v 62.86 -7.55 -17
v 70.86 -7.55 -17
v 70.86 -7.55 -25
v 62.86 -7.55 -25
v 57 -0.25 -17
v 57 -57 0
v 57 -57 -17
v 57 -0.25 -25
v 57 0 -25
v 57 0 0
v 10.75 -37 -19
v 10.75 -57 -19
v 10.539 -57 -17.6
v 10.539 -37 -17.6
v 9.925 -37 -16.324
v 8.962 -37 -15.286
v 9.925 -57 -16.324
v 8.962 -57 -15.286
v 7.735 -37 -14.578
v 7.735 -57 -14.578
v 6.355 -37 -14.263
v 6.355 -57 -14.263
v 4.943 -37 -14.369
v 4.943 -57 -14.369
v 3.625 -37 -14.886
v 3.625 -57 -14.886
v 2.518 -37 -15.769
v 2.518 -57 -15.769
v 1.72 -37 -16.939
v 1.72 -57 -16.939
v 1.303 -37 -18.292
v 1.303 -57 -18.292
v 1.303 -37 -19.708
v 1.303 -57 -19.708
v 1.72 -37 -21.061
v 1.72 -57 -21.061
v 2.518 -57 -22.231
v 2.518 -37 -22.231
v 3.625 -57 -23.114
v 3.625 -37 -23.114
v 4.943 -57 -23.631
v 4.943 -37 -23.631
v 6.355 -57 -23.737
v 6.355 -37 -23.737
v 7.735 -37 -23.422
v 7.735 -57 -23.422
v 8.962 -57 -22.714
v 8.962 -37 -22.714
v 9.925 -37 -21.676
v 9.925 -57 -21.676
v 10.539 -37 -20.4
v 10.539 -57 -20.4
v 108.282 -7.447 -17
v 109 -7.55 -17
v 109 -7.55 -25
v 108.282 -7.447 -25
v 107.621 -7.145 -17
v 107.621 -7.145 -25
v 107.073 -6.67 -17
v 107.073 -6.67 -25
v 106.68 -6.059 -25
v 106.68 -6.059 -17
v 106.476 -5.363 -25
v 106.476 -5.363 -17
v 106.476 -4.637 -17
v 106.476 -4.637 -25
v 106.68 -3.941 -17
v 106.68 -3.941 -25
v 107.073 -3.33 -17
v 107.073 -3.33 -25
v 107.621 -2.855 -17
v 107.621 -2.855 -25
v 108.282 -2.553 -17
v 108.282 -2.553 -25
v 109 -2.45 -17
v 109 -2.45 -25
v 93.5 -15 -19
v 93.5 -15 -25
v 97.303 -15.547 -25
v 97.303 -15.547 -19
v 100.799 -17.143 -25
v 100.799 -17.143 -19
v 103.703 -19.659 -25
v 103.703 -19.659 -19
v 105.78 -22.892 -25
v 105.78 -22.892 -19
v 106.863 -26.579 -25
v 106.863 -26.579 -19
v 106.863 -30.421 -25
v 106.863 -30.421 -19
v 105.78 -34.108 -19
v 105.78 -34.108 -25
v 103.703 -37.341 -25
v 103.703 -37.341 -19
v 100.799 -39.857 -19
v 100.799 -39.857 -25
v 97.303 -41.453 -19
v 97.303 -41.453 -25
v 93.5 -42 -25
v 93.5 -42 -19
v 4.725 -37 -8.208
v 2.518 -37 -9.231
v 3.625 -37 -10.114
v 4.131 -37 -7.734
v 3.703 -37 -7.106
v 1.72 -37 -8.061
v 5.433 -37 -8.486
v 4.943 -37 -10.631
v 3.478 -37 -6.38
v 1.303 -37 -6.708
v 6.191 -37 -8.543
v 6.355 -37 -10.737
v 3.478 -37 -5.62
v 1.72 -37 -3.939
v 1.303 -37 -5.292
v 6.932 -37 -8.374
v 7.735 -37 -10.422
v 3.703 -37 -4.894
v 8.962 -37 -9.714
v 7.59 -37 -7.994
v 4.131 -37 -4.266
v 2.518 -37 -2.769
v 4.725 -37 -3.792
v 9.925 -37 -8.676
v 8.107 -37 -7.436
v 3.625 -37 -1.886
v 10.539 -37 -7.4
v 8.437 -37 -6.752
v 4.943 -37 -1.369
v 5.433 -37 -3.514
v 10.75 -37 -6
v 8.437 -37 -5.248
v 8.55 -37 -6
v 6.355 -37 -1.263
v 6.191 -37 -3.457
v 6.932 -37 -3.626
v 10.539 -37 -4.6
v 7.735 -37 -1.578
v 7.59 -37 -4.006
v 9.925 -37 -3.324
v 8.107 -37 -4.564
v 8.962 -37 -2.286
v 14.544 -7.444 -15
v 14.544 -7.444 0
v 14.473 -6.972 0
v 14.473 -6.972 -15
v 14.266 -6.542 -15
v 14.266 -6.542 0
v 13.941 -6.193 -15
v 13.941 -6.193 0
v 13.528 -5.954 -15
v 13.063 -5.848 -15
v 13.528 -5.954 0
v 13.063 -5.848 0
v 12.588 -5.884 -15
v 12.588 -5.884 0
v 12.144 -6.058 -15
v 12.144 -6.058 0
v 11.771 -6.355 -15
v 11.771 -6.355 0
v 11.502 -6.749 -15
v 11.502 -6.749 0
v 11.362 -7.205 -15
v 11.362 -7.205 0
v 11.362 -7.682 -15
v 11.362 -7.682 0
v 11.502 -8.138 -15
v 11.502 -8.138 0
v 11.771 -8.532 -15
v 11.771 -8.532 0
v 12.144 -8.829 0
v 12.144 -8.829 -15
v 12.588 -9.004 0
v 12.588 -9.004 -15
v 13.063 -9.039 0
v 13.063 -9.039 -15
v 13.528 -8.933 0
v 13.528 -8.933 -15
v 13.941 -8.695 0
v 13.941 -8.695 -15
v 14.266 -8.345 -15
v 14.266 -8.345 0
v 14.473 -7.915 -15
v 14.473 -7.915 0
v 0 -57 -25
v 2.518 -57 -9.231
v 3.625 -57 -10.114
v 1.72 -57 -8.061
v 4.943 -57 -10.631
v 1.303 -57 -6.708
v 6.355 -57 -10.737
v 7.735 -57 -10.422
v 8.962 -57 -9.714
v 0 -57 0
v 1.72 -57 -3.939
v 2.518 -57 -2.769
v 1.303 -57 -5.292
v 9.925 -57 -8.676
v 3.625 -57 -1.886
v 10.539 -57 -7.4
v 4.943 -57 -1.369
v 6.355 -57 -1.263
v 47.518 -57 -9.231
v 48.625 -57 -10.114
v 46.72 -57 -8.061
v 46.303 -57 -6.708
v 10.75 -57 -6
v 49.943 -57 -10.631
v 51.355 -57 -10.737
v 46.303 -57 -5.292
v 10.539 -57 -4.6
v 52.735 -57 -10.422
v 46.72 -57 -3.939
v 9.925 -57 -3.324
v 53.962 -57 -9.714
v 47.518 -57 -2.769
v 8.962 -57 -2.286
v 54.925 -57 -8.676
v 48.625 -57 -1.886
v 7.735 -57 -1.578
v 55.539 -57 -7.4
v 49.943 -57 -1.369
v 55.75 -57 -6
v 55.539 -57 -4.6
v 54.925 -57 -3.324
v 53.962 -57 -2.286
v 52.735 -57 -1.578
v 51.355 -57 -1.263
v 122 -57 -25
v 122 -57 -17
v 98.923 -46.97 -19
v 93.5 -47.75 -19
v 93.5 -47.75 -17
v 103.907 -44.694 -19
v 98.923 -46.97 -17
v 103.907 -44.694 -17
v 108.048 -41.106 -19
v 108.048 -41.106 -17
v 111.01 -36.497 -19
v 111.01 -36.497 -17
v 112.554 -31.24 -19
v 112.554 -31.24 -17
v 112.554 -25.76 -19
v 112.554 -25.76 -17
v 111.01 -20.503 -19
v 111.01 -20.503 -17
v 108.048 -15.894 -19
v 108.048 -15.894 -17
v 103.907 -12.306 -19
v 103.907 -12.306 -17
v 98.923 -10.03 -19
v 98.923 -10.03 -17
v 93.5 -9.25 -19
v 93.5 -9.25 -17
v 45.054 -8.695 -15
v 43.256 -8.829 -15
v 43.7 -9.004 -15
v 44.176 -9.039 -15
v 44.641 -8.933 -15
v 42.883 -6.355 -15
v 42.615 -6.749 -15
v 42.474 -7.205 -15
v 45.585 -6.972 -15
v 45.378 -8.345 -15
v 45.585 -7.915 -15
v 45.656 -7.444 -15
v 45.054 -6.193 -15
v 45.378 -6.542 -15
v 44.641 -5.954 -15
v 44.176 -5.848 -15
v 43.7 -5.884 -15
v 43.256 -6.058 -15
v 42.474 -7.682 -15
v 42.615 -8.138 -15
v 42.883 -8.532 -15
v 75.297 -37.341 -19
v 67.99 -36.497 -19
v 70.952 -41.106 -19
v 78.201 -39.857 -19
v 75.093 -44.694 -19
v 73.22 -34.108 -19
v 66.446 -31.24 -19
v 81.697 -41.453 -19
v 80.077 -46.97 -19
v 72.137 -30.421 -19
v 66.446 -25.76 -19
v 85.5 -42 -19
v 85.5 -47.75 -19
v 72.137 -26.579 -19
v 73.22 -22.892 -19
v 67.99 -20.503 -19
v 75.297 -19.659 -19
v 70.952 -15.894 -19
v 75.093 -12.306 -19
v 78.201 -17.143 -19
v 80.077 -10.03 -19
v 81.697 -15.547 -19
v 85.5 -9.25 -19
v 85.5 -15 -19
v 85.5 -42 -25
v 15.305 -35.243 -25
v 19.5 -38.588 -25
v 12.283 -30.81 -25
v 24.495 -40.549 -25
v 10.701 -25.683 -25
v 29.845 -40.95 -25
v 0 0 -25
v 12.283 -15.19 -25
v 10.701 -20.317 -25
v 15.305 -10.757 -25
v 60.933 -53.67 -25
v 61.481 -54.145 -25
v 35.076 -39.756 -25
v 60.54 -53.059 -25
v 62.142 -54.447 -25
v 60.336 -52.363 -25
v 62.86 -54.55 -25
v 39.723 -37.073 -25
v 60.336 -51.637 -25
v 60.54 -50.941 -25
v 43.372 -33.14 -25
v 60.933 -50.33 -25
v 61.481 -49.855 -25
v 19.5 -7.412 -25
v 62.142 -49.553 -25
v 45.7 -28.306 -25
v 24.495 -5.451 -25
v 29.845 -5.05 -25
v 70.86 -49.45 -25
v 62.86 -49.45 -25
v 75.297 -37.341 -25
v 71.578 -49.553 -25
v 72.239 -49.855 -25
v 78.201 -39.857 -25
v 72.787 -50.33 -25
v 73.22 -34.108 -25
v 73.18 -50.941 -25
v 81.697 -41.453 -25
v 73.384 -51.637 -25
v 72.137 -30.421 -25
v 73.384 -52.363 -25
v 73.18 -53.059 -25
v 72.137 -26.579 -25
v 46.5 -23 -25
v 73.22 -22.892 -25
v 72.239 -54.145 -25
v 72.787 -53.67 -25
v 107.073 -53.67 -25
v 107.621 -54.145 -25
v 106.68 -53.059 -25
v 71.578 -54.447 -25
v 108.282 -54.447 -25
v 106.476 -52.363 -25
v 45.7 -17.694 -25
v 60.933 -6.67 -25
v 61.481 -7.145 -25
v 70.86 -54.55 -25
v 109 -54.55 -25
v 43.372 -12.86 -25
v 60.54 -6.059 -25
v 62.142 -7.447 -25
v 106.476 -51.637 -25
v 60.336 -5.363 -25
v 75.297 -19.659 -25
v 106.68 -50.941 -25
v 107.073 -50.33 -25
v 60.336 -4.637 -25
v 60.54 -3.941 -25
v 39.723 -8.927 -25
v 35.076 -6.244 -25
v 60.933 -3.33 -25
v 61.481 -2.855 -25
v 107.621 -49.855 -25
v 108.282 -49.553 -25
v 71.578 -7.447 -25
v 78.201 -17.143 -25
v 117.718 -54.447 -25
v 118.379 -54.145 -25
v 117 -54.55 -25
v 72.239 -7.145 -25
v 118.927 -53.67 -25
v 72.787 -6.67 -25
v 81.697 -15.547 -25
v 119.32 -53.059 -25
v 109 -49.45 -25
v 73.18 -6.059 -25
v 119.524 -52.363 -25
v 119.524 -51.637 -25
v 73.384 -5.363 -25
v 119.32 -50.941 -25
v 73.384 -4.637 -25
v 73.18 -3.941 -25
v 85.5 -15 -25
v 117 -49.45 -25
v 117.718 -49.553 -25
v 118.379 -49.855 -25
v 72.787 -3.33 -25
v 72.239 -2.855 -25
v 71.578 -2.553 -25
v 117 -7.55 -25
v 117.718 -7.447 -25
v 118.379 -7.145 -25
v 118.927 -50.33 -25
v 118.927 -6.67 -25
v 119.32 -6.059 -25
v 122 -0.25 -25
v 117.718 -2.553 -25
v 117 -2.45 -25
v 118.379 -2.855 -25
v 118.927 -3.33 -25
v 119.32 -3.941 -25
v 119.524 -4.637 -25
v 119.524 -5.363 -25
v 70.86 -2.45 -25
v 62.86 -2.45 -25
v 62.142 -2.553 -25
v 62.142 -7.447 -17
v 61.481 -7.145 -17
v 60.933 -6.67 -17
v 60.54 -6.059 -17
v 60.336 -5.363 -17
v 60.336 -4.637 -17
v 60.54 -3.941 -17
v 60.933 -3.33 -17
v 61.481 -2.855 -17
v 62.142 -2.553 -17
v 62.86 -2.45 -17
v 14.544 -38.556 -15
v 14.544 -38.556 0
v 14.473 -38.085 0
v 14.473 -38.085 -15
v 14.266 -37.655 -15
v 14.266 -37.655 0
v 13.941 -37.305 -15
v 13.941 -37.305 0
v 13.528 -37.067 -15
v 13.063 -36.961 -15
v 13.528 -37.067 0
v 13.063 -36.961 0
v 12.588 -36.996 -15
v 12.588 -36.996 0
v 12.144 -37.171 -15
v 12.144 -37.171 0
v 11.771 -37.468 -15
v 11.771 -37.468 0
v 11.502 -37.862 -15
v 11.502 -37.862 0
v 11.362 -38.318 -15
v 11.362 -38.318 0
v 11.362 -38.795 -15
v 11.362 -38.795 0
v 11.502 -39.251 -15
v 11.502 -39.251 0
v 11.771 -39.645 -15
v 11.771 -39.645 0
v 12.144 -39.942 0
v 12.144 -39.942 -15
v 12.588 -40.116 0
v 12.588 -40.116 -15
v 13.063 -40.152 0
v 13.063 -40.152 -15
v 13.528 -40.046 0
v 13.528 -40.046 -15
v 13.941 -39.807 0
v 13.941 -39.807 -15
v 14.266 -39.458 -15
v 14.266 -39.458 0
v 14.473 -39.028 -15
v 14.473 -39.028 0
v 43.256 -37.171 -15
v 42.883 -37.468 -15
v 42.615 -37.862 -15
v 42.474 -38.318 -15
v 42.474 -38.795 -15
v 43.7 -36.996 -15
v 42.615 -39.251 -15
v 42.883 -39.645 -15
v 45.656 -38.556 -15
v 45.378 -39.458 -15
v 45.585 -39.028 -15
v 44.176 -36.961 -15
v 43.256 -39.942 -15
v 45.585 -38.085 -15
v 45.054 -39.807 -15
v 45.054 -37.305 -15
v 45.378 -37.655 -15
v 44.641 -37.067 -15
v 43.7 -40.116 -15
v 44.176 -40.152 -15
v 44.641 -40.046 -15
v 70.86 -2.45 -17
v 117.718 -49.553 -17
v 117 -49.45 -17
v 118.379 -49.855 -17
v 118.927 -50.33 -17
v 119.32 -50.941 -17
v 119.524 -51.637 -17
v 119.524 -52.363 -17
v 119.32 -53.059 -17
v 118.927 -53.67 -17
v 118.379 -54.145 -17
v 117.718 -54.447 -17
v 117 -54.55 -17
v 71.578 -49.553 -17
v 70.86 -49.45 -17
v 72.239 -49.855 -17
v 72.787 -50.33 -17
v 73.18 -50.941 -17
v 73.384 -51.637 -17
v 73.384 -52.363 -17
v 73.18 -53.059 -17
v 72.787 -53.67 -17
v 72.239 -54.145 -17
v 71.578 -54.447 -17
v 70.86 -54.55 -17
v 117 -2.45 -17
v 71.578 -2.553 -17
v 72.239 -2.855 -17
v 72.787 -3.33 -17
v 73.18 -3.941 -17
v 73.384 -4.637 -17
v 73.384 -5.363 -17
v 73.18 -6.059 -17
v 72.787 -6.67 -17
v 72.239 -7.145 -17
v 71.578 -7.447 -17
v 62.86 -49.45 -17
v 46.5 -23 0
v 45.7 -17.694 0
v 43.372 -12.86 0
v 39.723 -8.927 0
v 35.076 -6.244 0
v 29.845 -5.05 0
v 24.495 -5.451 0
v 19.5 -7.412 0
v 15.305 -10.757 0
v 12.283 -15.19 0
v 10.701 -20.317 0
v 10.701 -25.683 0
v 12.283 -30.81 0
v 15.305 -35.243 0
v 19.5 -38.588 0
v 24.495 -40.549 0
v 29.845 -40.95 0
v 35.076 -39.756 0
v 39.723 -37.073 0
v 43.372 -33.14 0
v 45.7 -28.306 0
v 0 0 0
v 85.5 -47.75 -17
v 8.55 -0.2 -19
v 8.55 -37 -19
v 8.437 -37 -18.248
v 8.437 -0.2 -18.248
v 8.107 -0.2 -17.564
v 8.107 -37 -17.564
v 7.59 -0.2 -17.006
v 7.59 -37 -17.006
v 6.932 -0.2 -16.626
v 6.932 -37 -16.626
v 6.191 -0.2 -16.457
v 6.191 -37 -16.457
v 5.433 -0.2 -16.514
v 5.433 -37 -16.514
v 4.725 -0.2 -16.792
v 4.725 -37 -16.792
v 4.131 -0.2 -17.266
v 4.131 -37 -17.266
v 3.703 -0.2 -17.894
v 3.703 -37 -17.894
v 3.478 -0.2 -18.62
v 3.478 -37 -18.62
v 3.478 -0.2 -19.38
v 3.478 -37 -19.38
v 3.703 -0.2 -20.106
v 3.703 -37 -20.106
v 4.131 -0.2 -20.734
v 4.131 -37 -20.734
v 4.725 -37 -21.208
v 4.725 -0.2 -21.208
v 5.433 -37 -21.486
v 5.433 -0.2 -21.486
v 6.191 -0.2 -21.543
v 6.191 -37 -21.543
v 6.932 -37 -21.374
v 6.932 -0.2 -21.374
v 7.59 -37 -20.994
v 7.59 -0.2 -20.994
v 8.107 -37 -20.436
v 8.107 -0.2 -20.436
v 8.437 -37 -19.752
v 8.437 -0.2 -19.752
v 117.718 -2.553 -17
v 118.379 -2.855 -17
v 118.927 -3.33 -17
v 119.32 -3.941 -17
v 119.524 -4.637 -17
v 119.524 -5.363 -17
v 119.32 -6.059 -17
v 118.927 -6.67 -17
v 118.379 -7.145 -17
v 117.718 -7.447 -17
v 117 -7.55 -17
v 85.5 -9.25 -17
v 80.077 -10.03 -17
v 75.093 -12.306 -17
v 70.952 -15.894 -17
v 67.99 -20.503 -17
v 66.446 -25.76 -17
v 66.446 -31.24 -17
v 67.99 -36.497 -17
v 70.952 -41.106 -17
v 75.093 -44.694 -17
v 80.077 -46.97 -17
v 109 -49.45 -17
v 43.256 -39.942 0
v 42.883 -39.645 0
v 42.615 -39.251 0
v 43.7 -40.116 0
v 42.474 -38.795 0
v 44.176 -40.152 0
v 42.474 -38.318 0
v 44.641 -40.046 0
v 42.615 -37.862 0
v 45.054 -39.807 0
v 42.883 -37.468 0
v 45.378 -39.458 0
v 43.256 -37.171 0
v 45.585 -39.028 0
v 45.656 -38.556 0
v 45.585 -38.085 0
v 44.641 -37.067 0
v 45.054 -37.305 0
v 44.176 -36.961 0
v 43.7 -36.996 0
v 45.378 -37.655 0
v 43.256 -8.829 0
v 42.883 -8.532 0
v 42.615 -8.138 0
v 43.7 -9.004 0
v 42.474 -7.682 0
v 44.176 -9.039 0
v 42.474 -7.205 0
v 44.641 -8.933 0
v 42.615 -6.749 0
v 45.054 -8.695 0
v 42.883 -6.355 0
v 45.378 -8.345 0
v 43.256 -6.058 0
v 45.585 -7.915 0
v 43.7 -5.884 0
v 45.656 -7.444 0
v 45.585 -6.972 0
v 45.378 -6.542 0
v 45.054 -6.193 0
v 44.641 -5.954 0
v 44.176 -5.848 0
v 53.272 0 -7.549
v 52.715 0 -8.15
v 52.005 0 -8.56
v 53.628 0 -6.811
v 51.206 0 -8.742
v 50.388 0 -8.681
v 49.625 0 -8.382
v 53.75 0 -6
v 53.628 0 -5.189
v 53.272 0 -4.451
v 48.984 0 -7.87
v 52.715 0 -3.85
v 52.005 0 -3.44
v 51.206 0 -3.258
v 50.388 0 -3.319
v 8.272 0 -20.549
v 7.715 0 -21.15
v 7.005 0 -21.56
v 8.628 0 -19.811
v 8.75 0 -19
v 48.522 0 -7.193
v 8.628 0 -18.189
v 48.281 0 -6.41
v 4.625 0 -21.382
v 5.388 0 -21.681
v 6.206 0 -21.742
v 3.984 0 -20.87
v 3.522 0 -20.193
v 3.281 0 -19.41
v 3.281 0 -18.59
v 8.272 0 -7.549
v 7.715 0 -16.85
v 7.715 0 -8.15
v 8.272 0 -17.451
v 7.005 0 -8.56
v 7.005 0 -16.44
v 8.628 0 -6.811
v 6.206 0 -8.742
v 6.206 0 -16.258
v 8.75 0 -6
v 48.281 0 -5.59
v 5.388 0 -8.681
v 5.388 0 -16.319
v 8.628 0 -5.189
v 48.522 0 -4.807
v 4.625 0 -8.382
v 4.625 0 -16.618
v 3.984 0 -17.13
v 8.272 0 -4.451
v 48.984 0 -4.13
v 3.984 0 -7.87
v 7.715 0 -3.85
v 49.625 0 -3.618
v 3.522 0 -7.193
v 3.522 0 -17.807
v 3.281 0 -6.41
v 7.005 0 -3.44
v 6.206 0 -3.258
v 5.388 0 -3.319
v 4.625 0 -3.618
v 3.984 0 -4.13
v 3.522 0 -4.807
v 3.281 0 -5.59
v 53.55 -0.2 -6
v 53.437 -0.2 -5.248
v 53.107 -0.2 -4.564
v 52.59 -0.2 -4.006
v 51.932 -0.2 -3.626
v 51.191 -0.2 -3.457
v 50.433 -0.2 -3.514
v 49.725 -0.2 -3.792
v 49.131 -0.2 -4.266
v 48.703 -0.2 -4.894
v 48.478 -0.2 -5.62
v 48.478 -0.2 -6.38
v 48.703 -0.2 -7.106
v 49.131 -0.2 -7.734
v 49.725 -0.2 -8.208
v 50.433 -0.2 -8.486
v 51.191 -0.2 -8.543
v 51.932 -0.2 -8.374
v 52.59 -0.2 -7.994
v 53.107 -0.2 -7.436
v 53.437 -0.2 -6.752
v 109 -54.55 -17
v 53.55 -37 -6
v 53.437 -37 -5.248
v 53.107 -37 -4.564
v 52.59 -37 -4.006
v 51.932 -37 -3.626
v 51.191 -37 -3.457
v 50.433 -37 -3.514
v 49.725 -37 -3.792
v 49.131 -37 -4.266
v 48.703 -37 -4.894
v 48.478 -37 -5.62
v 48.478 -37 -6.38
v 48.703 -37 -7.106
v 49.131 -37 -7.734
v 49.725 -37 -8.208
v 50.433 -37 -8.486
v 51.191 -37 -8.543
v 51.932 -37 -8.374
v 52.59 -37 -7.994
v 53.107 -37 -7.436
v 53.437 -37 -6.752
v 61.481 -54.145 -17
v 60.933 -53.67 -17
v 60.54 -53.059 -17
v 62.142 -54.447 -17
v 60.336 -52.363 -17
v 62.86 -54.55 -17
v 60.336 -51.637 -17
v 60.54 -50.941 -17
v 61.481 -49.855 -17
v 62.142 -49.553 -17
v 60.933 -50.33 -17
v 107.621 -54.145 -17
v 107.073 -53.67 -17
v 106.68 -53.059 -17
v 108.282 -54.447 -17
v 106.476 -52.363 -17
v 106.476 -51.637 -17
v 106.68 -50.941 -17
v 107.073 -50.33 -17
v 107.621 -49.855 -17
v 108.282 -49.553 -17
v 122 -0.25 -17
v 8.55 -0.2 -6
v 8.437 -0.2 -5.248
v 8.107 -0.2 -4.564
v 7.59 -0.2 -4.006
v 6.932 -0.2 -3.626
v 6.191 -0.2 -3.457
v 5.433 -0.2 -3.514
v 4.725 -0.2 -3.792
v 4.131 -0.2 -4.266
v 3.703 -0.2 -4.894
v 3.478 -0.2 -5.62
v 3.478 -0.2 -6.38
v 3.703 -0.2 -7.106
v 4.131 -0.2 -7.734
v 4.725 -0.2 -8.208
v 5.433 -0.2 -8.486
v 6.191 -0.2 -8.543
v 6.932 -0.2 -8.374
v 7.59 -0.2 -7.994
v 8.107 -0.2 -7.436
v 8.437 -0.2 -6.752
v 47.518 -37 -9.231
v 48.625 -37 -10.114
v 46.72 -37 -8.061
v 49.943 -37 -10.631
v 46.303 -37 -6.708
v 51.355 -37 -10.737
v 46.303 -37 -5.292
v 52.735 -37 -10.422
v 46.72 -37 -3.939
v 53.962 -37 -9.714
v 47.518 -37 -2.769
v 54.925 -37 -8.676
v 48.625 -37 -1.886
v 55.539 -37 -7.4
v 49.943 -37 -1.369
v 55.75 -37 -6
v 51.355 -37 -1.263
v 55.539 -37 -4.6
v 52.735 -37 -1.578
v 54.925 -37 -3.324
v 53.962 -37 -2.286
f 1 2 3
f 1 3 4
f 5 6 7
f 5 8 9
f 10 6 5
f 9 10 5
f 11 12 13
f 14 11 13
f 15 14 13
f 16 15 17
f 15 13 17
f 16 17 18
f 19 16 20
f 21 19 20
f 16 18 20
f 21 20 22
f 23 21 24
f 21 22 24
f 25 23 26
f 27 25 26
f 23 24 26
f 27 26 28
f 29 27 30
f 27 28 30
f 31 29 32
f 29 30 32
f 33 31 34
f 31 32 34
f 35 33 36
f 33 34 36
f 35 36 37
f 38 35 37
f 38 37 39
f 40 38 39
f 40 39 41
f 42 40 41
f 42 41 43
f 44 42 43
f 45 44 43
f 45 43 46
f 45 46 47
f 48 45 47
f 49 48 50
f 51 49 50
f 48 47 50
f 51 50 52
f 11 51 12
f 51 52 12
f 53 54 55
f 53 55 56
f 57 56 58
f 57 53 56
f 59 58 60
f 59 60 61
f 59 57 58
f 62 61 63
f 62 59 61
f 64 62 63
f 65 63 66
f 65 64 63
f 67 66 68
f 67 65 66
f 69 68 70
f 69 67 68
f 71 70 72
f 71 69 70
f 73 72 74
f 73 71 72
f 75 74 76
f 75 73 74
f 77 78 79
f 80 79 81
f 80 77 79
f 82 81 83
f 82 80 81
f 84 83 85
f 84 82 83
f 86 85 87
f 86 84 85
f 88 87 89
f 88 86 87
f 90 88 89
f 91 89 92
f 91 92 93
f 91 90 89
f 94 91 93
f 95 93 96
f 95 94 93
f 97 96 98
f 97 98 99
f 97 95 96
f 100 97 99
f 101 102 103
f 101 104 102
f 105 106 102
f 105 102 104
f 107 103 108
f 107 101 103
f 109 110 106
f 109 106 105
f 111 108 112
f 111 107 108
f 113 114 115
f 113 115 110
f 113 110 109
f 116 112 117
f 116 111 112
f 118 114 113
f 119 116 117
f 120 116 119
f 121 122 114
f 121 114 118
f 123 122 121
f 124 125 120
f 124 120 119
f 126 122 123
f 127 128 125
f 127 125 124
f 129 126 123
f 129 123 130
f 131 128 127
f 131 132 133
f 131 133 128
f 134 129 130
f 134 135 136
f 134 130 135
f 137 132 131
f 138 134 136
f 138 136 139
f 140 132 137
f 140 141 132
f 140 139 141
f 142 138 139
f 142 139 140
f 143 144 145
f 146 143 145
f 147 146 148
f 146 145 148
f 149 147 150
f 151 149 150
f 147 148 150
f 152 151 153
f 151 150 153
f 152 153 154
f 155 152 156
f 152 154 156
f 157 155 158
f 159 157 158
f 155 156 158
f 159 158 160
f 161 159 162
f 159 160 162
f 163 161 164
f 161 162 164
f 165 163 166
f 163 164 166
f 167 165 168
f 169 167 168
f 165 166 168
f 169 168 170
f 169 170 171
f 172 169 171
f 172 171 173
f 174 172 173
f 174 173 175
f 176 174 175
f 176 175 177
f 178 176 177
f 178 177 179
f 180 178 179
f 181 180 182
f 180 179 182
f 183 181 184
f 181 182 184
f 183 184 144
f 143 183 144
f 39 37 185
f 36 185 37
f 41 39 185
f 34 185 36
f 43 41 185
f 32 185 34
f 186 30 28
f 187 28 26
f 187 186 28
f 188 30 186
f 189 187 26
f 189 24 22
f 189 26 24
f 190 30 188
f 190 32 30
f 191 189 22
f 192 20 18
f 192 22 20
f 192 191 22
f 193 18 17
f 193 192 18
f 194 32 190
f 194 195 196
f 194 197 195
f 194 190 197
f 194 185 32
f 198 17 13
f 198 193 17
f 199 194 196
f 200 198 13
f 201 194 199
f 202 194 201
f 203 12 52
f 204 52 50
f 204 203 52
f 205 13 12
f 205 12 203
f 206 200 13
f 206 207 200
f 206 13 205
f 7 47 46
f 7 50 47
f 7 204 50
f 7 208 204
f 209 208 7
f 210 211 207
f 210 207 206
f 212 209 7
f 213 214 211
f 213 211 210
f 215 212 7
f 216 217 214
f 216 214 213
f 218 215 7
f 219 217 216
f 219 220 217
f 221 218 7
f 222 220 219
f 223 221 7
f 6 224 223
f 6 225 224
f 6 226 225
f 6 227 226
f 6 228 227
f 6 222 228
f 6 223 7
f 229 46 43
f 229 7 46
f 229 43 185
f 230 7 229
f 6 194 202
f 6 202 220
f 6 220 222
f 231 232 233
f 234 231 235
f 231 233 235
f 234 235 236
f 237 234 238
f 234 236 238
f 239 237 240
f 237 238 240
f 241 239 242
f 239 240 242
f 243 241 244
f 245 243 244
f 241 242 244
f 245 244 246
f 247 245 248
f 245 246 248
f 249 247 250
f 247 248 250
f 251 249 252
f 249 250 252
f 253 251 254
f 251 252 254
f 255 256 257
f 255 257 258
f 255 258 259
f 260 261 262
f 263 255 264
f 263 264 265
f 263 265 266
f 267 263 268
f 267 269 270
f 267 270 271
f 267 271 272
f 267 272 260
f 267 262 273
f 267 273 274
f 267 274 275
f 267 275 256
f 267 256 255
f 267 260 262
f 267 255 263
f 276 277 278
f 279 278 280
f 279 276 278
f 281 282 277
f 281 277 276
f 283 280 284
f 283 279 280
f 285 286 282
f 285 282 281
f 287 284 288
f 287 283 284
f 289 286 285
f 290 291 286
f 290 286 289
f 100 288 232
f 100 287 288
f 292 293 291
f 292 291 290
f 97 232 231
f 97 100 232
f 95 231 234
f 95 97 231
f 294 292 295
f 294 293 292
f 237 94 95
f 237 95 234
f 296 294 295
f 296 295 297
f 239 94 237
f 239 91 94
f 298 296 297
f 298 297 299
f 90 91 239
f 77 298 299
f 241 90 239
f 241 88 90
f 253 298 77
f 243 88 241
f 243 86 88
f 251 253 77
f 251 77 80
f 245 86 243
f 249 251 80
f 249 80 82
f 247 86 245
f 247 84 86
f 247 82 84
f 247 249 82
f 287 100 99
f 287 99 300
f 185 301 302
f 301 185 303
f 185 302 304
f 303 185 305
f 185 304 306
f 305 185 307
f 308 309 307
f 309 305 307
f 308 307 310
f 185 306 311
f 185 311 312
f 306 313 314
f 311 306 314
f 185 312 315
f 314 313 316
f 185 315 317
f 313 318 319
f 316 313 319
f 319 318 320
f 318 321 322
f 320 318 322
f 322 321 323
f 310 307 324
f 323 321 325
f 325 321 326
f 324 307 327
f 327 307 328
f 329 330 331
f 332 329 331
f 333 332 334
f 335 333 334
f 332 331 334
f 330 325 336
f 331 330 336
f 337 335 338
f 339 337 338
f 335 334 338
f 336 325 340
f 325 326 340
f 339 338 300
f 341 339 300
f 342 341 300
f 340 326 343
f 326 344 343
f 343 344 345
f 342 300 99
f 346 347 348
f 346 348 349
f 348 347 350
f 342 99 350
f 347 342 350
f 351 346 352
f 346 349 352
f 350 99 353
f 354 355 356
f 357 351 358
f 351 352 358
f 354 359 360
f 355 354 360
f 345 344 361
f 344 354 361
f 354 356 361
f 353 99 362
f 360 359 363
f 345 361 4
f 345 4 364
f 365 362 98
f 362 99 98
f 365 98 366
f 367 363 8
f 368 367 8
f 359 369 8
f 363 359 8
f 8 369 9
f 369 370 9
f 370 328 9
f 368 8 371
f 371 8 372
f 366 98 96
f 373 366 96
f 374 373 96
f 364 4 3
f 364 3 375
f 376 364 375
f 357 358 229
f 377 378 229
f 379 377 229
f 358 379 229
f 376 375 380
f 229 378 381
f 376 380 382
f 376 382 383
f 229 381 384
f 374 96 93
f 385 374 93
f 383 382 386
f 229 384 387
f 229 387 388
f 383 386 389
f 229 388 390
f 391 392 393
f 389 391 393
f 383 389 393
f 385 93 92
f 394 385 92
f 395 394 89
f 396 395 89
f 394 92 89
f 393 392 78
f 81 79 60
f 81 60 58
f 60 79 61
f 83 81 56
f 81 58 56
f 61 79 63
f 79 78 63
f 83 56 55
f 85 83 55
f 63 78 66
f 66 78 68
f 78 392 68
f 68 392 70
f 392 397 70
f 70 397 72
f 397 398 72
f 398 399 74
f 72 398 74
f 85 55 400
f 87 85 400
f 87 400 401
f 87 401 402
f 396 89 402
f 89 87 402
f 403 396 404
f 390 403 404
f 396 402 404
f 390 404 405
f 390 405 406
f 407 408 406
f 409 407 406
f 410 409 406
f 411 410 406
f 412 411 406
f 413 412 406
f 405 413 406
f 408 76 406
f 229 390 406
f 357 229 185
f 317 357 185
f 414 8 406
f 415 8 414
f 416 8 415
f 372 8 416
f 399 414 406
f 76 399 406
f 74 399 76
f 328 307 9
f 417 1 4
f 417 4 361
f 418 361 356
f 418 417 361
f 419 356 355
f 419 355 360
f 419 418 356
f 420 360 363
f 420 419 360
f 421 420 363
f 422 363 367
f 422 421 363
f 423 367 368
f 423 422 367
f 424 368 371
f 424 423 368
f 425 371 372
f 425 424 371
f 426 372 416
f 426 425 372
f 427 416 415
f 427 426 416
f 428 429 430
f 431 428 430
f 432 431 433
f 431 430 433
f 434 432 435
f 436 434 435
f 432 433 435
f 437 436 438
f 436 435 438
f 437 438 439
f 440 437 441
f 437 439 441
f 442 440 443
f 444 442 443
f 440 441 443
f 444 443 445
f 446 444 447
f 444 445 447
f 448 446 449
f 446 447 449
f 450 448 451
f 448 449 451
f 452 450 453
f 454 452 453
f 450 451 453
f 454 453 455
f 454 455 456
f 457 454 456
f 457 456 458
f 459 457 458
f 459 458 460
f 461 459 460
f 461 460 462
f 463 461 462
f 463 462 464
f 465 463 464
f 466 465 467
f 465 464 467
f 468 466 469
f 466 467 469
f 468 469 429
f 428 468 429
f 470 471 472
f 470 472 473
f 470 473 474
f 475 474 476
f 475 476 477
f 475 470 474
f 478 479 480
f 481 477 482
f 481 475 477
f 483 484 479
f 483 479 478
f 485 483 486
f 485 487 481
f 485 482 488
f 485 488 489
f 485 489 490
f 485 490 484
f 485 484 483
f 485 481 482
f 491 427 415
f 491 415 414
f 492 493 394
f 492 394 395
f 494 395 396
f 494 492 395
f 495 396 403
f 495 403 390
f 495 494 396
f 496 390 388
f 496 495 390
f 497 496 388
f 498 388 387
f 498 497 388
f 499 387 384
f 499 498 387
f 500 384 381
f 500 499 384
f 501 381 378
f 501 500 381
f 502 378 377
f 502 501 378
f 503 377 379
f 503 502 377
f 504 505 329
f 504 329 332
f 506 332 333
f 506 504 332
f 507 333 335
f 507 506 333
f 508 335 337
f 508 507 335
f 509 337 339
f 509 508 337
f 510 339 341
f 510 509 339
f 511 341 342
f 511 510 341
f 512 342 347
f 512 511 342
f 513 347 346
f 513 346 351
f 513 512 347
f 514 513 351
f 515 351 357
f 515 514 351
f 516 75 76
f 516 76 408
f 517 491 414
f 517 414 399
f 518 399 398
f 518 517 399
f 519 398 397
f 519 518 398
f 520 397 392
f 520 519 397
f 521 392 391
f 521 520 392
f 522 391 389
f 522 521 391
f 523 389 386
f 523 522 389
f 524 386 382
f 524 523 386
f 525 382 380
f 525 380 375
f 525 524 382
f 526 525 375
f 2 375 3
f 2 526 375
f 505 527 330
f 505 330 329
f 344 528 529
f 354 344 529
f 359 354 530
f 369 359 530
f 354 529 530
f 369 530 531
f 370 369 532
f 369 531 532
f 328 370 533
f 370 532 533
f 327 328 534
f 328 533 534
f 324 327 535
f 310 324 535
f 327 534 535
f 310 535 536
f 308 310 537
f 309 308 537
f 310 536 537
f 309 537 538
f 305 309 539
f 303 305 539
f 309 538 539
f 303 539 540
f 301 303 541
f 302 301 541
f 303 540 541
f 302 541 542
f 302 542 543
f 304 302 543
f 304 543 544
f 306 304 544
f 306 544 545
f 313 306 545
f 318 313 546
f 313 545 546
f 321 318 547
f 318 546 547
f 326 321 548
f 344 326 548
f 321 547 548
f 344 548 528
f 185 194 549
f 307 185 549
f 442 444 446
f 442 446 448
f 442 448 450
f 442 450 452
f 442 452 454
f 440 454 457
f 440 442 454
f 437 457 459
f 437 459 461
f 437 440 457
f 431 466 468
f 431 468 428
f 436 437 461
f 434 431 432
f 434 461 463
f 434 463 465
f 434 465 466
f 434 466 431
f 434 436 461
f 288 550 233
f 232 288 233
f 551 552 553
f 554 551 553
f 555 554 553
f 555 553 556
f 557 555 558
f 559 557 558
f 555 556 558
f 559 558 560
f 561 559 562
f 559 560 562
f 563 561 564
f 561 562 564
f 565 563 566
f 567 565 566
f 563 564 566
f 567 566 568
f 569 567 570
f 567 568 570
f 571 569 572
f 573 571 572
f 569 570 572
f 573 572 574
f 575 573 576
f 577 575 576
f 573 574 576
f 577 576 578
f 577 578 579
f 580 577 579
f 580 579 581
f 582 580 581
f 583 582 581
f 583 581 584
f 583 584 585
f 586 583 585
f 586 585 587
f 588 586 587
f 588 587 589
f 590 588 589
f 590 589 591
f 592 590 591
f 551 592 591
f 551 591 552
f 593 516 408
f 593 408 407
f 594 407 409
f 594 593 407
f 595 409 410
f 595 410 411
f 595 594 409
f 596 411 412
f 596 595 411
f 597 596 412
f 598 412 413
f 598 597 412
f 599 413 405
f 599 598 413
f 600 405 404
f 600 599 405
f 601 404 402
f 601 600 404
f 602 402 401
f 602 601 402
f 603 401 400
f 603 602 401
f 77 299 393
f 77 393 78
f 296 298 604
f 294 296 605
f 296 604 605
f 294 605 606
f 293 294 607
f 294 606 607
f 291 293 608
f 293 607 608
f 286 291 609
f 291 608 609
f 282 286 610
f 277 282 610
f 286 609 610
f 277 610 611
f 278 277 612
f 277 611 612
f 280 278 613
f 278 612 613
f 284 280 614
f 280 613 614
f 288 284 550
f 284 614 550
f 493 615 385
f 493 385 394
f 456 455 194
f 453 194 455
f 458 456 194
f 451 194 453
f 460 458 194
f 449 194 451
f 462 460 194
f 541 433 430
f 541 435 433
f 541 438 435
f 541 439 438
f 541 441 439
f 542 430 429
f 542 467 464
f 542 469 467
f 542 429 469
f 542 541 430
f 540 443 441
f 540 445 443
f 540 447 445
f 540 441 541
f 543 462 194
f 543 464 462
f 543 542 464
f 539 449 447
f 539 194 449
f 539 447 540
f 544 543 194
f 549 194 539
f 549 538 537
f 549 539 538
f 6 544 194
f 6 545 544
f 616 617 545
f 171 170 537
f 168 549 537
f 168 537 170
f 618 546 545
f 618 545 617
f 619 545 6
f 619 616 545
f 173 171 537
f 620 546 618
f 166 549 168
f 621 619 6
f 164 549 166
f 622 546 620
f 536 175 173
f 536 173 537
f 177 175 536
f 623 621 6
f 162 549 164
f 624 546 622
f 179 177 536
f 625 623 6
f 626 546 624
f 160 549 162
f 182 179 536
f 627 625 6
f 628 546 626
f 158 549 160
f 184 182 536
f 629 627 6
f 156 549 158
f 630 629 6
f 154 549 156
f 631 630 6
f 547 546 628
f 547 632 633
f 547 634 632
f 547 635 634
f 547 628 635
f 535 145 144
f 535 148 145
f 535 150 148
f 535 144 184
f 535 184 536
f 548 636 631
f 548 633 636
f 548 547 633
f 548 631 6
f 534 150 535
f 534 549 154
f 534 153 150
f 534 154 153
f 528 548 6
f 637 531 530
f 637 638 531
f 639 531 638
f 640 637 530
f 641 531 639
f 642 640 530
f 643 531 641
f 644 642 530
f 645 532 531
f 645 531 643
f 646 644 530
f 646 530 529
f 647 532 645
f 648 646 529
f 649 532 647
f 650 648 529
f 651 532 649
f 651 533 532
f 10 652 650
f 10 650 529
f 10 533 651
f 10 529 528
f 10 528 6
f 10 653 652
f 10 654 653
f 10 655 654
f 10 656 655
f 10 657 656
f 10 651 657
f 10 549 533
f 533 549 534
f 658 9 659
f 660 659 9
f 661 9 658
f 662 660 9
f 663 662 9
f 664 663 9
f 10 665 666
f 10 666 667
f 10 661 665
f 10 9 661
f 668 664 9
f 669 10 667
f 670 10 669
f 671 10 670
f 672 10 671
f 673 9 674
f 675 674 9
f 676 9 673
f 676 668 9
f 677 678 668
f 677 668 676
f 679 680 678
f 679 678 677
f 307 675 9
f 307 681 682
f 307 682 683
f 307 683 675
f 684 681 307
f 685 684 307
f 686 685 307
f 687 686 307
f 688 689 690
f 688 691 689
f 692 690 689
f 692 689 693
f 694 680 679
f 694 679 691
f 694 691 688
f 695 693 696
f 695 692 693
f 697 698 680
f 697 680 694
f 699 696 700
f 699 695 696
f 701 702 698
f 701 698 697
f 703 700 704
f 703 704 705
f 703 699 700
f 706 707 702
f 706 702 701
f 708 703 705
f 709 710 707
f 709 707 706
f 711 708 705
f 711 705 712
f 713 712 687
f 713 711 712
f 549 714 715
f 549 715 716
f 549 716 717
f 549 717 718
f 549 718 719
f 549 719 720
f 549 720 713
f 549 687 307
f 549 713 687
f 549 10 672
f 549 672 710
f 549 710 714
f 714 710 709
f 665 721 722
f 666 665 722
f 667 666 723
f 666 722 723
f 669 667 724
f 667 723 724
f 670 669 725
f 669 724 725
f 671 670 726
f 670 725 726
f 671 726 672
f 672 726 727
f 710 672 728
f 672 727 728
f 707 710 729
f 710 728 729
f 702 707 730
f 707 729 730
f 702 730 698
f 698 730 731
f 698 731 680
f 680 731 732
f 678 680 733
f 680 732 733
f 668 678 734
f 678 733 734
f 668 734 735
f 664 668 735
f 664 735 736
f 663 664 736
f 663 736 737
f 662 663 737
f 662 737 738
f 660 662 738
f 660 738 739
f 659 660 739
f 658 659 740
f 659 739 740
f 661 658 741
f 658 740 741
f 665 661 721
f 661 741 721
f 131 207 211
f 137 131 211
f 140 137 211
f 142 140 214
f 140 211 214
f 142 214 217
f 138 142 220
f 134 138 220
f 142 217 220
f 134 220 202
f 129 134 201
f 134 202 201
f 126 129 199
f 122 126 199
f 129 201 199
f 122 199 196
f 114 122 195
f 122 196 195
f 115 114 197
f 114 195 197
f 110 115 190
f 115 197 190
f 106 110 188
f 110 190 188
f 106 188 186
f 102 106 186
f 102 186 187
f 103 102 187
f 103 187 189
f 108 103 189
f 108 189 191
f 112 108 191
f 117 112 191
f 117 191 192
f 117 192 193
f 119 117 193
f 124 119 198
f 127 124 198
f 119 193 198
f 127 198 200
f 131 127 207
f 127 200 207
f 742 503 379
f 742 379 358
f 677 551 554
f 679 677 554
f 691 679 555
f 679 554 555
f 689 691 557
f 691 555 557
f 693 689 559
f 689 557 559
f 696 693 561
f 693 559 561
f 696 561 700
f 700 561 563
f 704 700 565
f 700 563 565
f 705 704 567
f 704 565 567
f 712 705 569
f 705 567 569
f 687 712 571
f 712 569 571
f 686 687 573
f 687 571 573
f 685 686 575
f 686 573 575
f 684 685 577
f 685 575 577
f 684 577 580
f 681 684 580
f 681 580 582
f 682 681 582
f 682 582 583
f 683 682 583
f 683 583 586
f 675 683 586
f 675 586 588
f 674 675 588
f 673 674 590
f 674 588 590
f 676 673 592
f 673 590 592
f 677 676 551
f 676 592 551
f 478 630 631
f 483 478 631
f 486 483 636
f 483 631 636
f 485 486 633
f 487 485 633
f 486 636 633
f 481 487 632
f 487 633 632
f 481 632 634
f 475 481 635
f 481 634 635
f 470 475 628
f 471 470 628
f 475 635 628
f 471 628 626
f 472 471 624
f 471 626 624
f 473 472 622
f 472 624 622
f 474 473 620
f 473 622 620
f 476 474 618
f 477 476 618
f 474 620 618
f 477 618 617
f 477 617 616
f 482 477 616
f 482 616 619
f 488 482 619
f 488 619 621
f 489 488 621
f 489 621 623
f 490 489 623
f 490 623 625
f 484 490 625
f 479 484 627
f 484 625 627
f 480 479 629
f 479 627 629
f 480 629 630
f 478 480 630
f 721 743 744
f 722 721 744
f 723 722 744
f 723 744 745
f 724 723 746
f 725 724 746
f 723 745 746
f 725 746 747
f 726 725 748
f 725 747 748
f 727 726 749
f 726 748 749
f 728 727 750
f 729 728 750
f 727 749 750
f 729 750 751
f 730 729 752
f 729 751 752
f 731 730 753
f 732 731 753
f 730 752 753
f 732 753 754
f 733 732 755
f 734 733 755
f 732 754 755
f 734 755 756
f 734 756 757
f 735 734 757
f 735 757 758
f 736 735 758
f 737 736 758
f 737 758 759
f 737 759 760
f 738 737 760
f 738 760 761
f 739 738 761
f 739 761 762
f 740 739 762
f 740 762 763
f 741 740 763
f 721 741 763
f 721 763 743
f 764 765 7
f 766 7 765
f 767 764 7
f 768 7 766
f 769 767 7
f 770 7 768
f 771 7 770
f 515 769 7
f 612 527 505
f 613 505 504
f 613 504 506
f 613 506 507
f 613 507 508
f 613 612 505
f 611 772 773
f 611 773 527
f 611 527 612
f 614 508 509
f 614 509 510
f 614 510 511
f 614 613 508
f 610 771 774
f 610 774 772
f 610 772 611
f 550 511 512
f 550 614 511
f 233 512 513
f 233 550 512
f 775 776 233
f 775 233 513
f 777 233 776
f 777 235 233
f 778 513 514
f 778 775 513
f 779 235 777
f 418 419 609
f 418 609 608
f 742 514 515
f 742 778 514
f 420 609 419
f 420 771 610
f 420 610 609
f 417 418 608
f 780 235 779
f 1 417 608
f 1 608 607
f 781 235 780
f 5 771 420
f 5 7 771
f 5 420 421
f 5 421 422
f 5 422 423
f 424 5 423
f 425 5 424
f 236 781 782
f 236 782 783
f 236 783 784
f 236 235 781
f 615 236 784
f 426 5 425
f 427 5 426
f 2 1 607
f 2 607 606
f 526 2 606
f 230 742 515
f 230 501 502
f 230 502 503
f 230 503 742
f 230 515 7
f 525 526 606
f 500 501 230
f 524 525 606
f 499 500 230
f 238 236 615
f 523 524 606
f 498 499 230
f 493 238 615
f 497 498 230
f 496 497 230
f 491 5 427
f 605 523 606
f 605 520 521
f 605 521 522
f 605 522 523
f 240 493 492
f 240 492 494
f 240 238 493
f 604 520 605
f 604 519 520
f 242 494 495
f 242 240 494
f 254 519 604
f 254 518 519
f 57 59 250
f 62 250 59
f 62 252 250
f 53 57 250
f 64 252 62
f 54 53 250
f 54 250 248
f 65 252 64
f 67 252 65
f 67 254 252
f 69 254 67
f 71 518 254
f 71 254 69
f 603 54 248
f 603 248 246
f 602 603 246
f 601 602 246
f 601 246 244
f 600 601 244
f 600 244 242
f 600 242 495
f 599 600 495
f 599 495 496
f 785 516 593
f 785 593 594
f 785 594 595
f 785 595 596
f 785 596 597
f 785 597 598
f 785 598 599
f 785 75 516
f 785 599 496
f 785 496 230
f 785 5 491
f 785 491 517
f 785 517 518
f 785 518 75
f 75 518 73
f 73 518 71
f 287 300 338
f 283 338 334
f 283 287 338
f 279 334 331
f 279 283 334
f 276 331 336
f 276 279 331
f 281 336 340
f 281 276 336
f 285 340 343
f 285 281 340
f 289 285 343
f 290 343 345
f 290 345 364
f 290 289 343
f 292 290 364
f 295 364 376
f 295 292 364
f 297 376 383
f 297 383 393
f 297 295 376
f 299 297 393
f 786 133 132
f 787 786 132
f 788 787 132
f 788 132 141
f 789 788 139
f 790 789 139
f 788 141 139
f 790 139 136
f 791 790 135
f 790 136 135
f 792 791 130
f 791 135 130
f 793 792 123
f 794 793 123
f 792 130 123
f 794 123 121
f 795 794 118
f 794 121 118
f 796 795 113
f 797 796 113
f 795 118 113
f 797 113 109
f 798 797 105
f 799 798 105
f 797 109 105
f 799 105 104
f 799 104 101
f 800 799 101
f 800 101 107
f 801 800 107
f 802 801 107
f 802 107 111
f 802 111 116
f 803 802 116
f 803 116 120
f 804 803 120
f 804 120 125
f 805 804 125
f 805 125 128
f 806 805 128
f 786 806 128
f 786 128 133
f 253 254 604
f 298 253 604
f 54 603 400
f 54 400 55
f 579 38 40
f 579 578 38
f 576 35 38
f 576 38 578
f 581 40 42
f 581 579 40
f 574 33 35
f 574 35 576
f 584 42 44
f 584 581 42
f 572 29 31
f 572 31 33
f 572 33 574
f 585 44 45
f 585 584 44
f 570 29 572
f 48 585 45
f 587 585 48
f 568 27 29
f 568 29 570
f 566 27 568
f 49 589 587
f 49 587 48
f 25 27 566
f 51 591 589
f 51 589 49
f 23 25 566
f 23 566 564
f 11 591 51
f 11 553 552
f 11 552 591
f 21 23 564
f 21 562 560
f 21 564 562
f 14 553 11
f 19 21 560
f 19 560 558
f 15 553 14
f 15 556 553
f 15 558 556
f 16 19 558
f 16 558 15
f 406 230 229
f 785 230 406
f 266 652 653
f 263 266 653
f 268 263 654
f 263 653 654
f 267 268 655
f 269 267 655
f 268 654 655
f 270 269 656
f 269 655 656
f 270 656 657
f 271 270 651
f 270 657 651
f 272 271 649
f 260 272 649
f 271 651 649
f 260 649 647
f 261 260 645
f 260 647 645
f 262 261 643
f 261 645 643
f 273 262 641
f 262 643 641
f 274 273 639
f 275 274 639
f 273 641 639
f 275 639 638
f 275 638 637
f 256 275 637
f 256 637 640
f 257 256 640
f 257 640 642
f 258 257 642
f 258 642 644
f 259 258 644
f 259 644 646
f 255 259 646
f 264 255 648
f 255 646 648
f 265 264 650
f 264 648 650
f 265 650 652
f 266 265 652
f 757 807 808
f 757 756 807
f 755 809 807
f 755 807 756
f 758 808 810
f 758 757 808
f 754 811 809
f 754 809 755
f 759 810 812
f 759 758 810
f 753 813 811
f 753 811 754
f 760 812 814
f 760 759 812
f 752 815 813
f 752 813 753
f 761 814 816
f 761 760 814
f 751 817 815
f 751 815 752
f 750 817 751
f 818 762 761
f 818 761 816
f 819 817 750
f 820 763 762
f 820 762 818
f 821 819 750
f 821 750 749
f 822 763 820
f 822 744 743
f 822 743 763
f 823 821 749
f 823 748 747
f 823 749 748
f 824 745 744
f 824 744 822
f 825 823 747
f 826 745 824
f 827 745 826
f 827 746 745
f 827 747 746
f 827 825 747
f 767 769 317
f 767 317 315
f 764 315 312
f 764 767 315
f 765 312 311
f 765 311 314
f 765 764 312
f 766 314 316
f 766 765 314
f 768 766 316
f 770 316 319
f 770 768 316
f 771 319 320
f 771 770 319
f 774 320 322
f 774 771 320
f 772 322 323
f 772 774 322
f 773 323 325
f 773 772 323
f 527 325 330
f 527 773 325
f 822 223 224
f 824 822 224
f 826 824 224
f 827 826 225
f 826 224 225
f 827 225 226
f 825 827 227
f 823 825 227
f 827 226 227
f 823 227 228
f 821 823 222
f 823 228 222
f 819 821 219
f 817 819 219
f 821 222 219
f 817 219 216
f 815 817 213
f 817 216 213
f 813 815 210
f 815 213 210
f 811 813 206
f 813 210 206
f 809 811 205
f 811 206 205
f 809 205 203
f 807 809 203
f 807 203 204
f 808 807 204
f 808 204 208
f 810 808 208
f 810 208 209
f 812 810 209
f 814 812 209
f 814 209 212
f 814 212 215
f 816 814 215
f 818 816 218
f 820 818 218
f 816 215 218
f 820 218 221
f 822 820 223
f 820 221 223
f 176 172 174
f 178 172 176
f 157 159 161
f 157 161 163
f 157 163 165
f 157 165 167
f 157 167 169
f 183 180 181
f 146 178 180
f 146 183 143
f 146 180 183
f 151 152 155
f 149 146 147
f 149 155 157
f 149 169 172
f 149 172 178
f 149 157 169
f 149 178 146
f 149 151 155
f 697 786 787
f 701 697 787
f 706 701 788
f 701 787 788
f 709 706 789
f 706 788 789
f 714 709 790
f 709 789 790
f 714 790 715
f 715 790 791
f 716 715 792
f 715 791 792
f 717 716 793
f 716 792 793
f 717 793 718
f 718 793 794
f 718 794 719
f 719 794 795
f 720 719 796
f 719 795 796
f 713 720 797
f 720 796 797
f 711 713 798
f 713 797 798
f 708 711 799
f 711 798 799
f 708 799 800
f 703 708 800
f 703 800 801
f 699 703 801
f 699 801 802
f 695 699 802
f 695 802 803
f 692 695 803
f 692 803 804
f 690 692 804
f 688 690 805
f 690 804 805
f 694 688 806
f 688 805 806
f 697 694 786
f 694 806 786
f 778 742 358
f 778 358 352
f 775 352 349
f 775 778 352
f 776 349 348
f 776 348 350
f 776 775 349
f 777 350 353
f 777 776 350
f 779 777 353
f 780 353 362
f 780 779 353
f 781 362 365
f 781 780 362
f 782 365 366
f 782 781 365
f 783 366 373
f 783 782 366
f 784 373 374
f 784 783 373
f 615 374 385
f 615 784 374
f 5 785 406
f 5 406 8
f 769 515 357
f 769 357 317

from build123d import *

# Parameters (mm, degrees)
F0_W     = 57
F0_H     = 57
F0_R     = 1.6
F0_R_2   = 18
F0_W_2   = 65
F1_DEPTH = 25
F2_DEPTH = 17
F3_DEPTH = 19
F4_R     = 2.55
F5_DEPTH = 60
F4_R_2   = 4.75
F6_DEPTH = 20
F7_DEPTH = 15
F8_W     = 65
F8_H     = 8
F9_DEPTH = 0.25
F10_SIZE = 0.2


# Not quite as in the source:
# - a feature names something its author has since deleted; it is built from what else it names


with BuildPart() as f1:
    # F0 (on Top) → F1 (new body)
    with BuildSketch(Plane.XY):
        with Locations((28.5, -28.5)):
            Rectangle(F0_W, F0_H)
        with Locations((12.9436508139, -38.5563491861)):
            Circle(F0_R, mode=Mode.SUBTRACT)
        with Locations((44.0563491861, -38.5563491861)):
            Circle(F0_R, mode=Mode.SUBTRACT)
        with Locations((28.5, -23)):
            Circle(F0_R_2, mode=Mode.SUBTRACT)
        with Locations((12.9436508139, -7.4436508139)):
            Circle(F0_R, mode=Mode.SUBTRACT)
        with Locations((44.0563491861, -7.4436508139)):
            Circle(F0_R, mode=Mode.SUBTRACT)
        with Locations((89.5, -28.5)):
            Rectangle(F0_W_2, F0_H)
        with BuildLine():
            Line((62.86, -49.45), (70.86, -49.45))
            ThreePointArc((70.86, -49.45), (73.41, -52), (70.86, -54.55))
            Line((70.86, -54.55), (62.86, -54.55))
            ThreePointArc((62.86, -54.55), (60.31, -52), (62.86, -49.45))
        make_face(mode=Mode.SUBTRACT)
        with BuildLine():
            Line((117, -54.55), (109, -54.55))
            ThreePointArc((109, -54.55), (106.45, -52), (109, -49.45))
            Line((109, -49.45), (117, -49.45))
            ThreePointArc((117, -49.45), (119.55, -52), (117, -54.55))
        make_face(mode=Mode.SUBTRACT)
        with BuildLine():
            Line((85.5, -9.25), (93.5, -9.25))
            ThreePointArc((93.5, -9.25), (112.75, -28.5), (93.5, -47.75))
            Line((93.5, -47.75), (85.5, -47.75))
            ThreePointArc((85.5, -47.75), (66.25, -28.5), (85.5, -9.25))
        make_face(mode=Mode.SUBTRACT)
        with BuildLine():
            Line((62.86, -2.45), (70.86, -2.45))
            ThreePointArc((70.86, -2.45), (73.41, -5), (70.86, -7.55))
            Line((70.86, -7.55), (62.86, -7.55))
            ThreePointArc((62.86, -7.55), (60.31, -5), (62.86, -2.45))
        make_face(mode=Mode.SUBTRACT)
        with BuildLine():
            Line((117, -7.55), (109, -7.55))
            ThreePointArc((109, -7.55), (106.45, -5), (109, -2.45))
            Line((109, -2.45), (117, -2.45))
            ThreePointArc((117, -2.45), (119.55, -5), (117, -7.55))
        make_face(mode=Mode.SUBTRACT)
        with Locations((12.9436508139, -7.4436508139)):
            Circle(F0_R)
        with Locations((44.0563491861, -7.4436508139)):
            Circle(F0_R)
        with Locations((44.0563491861, -38.5563491861)):
            Circle(F0_R)
        with Locations((12.9436508139, -38.5563491861)):
            Circle(F0_R)
        with BuildLine():
            ThreePointArc((93.5, -47.75), (112.75, -28.5), (93.5, -9.25))
            Line((93.5, -9.25), (85.5, -9.25))
            ThreePointArc((85.5, -9.25), (66.25, -28.5), (85.5, -47.75))
            Line((85.5, -47.75), (93.5, -47.75))
        make_face()
        with BuildLine():
            Line((85.5, -15), (93.5, -15))
            ThreePointArc((93.5, -15), (107, -28.5), (93.5, -42))
            Line((93.5, -42), (85.5, -42))
            ThreePointArc((85.5, -42), (72, -28.5), (85.5, -15))
        make_face(mode=Mode.SUBTRACT)
    extrude(amount=-F1_DEPTH)

    # F0 (on Top) → F2 (cut)
    with BuildSketch(Plane.XY):
        with Locations((89.5, -28.5)):
            Rectangle(F0_W_2, F0_H)
        with BuildLine():
            Line((62.86, -49.45), (70.86, -49.45))
            ThreePointArc((70.86, -49.45), (73.41, -52), (70.86, -54.55))
            Line((70.86, -54.55), (62.86, -54.55))
            ThreePointArc((62.86, -54.55), (60.31, -52), (62.86, -49.45))
        make_face(mode=Mode.SUBTRACT)
        with BuildLine():
            Line((117, -54.55), (109, -54.55))
            ThreePointArc((109, -54.55), (106.45, -52), (109, -49.45))
            Line((109, -49.45), (117, -49.45))
            ThreePointArc((117, -49.45), (119.55, -52), (117, -54.55))
        make_face(mode=Mode.SUBTRACT)
        with BuildLine():
            Line((85.5, -9.25), (93.5, -9.25))
            ThreePointArc((93.5, -9.25), (112.75, -28.5), (93.5, -47.75))
            Line((93.5, -47.75), (85.5, -47.75))
            ThreePointArc((85.5, -47.75), (66.25, -28.5), (85.5, -9.25))
        make_face(mode=Mode.SUBTRACT)
        with BuildLine():
            Line((62.86, -2.45), (70.86, -2.45))
            ThreePointArc((70.86, -2.45), (73.41, -5), (70.86, -7.55))
            Line((70.86, -7.55), (62.86, -7.55))
            ThreePointArc((62.86, -7.55), (60.31, -5), (62.86, -2.45))
        make_face(mode=Mode.SUBTRACT)
        with BuildLine():
            Line((117, -7.55), (109, -7.55))
            ThreePointArc((109, -7.55), (106.45, -5), (109, -2.45))
            Line((109, -2.45), (117, -2.45))
            ThreePointArc((117, -2.45), (119.55, -5), (117, -7.55))
        make_face(mode=Mode.SUBTRACT)
    extrude(amount=-F2_DEPTH, mode=Mode.SUBTRACT)

    # F0 (on Top) → F3 (cut)
    with BuildSketch(Plane.XY):
        with BuildLine():
            ThreePointArc((93.5, -47.75), (112.75, -28.5), (93.5, -9.25))
            Line((93.5, -9.25), (85.5, -9.25))
            ThreePointArc((85.5, -9.25), (66.25, -28.5), (85.5, -47.75))
            Line((85.5, -47.75), (93.5, -47.75))
        make_face()
        with BuildLine():
            Line((85.5, -15), (93.5, -15))
            ThreePointArc((93.5, -15), (107, -28.5), (93.5, -42))
            Line((93.5, -42), (85.5, -42))
            ThreePointArc((85.5, -42), (72, -28.5), (85.5, -15))
        make_face(mode=Mode.SUBTRACT)
        with BuildLine():
            ThreePointArc((93.5, -42), (107, -28.5), (93.5, -15))
            Line((93.5, -15), (85.5, -15))
            ThreePointArc((85.5, -15), (72, -28.5), (85.5, -42))
            Line((85.5, -42), (93.5, -42))
        make_face()
    extrude(amount=-F3_DEPTH, mode=Mode.SUBTRACT)

    # F4 (on face) → F5 (cut)
    with BuildSketch(Plane.XZ.offset(57)):
        with Locations((6, -6)):
            Circle(F4_R)
        with Locations((6, -19)):
            Circle(F4_R)
        with Locations((51, -6)):
            Circle(F4_R)
    extrude(amount=-F5_DEPTH, mode=Mode.SUBTRACT)

    # F4 (on face) → F6 (cut)
    with BuildSketch(Plane.XZ.offset(57)):
        with Locations((6, -6)):
            Circle(F4_R_2)
        with Locations((6, -6)):
            Circle(F4_R, mode=Mode.SUBTRACT)
        with Locations((6, -19)):
            Circle(F4_R_2)
        with Locations((6, -19)):
            Circle(F4_R, mode=Mode.SUBTRACT)
        with Locations((51, -6)):
            Circle(F4_R_2)
        with Locations((51, -6)):
            Circle(F4_R, mode=Mode.SUBTRACT)
    extrude(amount=-F6_DEPTH, mode=Mode.SUBTRACT)

    # F0 (on Top) → F7 (cut)
    with BuildSketch(Plane.XY):
        with Locations((44.0563491861, -7.4436508139)):
            Circle(F0_R)
        with Locations((44.0563491861, -38.5563491861)):
            Circle(F0_R)
        with Locations((12.9436508139, -38.5563491861)):
            Circle(F0_R)
        with Locations((12.9436508139, -7.4436508139)):
            Circle(F0_R)
    extrude(amount=-F7_DEPTH, mode=Mode.SUBTRACT)

    # F8 (on face) → F9 (cut)
    with BuildSketch(Plane(origin=(0, 0, 0), x_dir=(-1, 0, 0), z_dir=(0, 1, 0))):
        with Locations((-89.5, -21)):
            Rectangle(F8_W, F8_H)
    extrude(amount=-F9_DEPTH, mode=Mode.SUBTRACT)

    # F10
    f10_edges = [f1.edges().sort_by_distance(p)[0] for p in [
        (48.45, 0, -6),
        (3.45, 0, -6),
        (3.45, 0, -19),
    ]]
    chamfer(f10_edges, length=F10_SIZE)


solid = f1.part
